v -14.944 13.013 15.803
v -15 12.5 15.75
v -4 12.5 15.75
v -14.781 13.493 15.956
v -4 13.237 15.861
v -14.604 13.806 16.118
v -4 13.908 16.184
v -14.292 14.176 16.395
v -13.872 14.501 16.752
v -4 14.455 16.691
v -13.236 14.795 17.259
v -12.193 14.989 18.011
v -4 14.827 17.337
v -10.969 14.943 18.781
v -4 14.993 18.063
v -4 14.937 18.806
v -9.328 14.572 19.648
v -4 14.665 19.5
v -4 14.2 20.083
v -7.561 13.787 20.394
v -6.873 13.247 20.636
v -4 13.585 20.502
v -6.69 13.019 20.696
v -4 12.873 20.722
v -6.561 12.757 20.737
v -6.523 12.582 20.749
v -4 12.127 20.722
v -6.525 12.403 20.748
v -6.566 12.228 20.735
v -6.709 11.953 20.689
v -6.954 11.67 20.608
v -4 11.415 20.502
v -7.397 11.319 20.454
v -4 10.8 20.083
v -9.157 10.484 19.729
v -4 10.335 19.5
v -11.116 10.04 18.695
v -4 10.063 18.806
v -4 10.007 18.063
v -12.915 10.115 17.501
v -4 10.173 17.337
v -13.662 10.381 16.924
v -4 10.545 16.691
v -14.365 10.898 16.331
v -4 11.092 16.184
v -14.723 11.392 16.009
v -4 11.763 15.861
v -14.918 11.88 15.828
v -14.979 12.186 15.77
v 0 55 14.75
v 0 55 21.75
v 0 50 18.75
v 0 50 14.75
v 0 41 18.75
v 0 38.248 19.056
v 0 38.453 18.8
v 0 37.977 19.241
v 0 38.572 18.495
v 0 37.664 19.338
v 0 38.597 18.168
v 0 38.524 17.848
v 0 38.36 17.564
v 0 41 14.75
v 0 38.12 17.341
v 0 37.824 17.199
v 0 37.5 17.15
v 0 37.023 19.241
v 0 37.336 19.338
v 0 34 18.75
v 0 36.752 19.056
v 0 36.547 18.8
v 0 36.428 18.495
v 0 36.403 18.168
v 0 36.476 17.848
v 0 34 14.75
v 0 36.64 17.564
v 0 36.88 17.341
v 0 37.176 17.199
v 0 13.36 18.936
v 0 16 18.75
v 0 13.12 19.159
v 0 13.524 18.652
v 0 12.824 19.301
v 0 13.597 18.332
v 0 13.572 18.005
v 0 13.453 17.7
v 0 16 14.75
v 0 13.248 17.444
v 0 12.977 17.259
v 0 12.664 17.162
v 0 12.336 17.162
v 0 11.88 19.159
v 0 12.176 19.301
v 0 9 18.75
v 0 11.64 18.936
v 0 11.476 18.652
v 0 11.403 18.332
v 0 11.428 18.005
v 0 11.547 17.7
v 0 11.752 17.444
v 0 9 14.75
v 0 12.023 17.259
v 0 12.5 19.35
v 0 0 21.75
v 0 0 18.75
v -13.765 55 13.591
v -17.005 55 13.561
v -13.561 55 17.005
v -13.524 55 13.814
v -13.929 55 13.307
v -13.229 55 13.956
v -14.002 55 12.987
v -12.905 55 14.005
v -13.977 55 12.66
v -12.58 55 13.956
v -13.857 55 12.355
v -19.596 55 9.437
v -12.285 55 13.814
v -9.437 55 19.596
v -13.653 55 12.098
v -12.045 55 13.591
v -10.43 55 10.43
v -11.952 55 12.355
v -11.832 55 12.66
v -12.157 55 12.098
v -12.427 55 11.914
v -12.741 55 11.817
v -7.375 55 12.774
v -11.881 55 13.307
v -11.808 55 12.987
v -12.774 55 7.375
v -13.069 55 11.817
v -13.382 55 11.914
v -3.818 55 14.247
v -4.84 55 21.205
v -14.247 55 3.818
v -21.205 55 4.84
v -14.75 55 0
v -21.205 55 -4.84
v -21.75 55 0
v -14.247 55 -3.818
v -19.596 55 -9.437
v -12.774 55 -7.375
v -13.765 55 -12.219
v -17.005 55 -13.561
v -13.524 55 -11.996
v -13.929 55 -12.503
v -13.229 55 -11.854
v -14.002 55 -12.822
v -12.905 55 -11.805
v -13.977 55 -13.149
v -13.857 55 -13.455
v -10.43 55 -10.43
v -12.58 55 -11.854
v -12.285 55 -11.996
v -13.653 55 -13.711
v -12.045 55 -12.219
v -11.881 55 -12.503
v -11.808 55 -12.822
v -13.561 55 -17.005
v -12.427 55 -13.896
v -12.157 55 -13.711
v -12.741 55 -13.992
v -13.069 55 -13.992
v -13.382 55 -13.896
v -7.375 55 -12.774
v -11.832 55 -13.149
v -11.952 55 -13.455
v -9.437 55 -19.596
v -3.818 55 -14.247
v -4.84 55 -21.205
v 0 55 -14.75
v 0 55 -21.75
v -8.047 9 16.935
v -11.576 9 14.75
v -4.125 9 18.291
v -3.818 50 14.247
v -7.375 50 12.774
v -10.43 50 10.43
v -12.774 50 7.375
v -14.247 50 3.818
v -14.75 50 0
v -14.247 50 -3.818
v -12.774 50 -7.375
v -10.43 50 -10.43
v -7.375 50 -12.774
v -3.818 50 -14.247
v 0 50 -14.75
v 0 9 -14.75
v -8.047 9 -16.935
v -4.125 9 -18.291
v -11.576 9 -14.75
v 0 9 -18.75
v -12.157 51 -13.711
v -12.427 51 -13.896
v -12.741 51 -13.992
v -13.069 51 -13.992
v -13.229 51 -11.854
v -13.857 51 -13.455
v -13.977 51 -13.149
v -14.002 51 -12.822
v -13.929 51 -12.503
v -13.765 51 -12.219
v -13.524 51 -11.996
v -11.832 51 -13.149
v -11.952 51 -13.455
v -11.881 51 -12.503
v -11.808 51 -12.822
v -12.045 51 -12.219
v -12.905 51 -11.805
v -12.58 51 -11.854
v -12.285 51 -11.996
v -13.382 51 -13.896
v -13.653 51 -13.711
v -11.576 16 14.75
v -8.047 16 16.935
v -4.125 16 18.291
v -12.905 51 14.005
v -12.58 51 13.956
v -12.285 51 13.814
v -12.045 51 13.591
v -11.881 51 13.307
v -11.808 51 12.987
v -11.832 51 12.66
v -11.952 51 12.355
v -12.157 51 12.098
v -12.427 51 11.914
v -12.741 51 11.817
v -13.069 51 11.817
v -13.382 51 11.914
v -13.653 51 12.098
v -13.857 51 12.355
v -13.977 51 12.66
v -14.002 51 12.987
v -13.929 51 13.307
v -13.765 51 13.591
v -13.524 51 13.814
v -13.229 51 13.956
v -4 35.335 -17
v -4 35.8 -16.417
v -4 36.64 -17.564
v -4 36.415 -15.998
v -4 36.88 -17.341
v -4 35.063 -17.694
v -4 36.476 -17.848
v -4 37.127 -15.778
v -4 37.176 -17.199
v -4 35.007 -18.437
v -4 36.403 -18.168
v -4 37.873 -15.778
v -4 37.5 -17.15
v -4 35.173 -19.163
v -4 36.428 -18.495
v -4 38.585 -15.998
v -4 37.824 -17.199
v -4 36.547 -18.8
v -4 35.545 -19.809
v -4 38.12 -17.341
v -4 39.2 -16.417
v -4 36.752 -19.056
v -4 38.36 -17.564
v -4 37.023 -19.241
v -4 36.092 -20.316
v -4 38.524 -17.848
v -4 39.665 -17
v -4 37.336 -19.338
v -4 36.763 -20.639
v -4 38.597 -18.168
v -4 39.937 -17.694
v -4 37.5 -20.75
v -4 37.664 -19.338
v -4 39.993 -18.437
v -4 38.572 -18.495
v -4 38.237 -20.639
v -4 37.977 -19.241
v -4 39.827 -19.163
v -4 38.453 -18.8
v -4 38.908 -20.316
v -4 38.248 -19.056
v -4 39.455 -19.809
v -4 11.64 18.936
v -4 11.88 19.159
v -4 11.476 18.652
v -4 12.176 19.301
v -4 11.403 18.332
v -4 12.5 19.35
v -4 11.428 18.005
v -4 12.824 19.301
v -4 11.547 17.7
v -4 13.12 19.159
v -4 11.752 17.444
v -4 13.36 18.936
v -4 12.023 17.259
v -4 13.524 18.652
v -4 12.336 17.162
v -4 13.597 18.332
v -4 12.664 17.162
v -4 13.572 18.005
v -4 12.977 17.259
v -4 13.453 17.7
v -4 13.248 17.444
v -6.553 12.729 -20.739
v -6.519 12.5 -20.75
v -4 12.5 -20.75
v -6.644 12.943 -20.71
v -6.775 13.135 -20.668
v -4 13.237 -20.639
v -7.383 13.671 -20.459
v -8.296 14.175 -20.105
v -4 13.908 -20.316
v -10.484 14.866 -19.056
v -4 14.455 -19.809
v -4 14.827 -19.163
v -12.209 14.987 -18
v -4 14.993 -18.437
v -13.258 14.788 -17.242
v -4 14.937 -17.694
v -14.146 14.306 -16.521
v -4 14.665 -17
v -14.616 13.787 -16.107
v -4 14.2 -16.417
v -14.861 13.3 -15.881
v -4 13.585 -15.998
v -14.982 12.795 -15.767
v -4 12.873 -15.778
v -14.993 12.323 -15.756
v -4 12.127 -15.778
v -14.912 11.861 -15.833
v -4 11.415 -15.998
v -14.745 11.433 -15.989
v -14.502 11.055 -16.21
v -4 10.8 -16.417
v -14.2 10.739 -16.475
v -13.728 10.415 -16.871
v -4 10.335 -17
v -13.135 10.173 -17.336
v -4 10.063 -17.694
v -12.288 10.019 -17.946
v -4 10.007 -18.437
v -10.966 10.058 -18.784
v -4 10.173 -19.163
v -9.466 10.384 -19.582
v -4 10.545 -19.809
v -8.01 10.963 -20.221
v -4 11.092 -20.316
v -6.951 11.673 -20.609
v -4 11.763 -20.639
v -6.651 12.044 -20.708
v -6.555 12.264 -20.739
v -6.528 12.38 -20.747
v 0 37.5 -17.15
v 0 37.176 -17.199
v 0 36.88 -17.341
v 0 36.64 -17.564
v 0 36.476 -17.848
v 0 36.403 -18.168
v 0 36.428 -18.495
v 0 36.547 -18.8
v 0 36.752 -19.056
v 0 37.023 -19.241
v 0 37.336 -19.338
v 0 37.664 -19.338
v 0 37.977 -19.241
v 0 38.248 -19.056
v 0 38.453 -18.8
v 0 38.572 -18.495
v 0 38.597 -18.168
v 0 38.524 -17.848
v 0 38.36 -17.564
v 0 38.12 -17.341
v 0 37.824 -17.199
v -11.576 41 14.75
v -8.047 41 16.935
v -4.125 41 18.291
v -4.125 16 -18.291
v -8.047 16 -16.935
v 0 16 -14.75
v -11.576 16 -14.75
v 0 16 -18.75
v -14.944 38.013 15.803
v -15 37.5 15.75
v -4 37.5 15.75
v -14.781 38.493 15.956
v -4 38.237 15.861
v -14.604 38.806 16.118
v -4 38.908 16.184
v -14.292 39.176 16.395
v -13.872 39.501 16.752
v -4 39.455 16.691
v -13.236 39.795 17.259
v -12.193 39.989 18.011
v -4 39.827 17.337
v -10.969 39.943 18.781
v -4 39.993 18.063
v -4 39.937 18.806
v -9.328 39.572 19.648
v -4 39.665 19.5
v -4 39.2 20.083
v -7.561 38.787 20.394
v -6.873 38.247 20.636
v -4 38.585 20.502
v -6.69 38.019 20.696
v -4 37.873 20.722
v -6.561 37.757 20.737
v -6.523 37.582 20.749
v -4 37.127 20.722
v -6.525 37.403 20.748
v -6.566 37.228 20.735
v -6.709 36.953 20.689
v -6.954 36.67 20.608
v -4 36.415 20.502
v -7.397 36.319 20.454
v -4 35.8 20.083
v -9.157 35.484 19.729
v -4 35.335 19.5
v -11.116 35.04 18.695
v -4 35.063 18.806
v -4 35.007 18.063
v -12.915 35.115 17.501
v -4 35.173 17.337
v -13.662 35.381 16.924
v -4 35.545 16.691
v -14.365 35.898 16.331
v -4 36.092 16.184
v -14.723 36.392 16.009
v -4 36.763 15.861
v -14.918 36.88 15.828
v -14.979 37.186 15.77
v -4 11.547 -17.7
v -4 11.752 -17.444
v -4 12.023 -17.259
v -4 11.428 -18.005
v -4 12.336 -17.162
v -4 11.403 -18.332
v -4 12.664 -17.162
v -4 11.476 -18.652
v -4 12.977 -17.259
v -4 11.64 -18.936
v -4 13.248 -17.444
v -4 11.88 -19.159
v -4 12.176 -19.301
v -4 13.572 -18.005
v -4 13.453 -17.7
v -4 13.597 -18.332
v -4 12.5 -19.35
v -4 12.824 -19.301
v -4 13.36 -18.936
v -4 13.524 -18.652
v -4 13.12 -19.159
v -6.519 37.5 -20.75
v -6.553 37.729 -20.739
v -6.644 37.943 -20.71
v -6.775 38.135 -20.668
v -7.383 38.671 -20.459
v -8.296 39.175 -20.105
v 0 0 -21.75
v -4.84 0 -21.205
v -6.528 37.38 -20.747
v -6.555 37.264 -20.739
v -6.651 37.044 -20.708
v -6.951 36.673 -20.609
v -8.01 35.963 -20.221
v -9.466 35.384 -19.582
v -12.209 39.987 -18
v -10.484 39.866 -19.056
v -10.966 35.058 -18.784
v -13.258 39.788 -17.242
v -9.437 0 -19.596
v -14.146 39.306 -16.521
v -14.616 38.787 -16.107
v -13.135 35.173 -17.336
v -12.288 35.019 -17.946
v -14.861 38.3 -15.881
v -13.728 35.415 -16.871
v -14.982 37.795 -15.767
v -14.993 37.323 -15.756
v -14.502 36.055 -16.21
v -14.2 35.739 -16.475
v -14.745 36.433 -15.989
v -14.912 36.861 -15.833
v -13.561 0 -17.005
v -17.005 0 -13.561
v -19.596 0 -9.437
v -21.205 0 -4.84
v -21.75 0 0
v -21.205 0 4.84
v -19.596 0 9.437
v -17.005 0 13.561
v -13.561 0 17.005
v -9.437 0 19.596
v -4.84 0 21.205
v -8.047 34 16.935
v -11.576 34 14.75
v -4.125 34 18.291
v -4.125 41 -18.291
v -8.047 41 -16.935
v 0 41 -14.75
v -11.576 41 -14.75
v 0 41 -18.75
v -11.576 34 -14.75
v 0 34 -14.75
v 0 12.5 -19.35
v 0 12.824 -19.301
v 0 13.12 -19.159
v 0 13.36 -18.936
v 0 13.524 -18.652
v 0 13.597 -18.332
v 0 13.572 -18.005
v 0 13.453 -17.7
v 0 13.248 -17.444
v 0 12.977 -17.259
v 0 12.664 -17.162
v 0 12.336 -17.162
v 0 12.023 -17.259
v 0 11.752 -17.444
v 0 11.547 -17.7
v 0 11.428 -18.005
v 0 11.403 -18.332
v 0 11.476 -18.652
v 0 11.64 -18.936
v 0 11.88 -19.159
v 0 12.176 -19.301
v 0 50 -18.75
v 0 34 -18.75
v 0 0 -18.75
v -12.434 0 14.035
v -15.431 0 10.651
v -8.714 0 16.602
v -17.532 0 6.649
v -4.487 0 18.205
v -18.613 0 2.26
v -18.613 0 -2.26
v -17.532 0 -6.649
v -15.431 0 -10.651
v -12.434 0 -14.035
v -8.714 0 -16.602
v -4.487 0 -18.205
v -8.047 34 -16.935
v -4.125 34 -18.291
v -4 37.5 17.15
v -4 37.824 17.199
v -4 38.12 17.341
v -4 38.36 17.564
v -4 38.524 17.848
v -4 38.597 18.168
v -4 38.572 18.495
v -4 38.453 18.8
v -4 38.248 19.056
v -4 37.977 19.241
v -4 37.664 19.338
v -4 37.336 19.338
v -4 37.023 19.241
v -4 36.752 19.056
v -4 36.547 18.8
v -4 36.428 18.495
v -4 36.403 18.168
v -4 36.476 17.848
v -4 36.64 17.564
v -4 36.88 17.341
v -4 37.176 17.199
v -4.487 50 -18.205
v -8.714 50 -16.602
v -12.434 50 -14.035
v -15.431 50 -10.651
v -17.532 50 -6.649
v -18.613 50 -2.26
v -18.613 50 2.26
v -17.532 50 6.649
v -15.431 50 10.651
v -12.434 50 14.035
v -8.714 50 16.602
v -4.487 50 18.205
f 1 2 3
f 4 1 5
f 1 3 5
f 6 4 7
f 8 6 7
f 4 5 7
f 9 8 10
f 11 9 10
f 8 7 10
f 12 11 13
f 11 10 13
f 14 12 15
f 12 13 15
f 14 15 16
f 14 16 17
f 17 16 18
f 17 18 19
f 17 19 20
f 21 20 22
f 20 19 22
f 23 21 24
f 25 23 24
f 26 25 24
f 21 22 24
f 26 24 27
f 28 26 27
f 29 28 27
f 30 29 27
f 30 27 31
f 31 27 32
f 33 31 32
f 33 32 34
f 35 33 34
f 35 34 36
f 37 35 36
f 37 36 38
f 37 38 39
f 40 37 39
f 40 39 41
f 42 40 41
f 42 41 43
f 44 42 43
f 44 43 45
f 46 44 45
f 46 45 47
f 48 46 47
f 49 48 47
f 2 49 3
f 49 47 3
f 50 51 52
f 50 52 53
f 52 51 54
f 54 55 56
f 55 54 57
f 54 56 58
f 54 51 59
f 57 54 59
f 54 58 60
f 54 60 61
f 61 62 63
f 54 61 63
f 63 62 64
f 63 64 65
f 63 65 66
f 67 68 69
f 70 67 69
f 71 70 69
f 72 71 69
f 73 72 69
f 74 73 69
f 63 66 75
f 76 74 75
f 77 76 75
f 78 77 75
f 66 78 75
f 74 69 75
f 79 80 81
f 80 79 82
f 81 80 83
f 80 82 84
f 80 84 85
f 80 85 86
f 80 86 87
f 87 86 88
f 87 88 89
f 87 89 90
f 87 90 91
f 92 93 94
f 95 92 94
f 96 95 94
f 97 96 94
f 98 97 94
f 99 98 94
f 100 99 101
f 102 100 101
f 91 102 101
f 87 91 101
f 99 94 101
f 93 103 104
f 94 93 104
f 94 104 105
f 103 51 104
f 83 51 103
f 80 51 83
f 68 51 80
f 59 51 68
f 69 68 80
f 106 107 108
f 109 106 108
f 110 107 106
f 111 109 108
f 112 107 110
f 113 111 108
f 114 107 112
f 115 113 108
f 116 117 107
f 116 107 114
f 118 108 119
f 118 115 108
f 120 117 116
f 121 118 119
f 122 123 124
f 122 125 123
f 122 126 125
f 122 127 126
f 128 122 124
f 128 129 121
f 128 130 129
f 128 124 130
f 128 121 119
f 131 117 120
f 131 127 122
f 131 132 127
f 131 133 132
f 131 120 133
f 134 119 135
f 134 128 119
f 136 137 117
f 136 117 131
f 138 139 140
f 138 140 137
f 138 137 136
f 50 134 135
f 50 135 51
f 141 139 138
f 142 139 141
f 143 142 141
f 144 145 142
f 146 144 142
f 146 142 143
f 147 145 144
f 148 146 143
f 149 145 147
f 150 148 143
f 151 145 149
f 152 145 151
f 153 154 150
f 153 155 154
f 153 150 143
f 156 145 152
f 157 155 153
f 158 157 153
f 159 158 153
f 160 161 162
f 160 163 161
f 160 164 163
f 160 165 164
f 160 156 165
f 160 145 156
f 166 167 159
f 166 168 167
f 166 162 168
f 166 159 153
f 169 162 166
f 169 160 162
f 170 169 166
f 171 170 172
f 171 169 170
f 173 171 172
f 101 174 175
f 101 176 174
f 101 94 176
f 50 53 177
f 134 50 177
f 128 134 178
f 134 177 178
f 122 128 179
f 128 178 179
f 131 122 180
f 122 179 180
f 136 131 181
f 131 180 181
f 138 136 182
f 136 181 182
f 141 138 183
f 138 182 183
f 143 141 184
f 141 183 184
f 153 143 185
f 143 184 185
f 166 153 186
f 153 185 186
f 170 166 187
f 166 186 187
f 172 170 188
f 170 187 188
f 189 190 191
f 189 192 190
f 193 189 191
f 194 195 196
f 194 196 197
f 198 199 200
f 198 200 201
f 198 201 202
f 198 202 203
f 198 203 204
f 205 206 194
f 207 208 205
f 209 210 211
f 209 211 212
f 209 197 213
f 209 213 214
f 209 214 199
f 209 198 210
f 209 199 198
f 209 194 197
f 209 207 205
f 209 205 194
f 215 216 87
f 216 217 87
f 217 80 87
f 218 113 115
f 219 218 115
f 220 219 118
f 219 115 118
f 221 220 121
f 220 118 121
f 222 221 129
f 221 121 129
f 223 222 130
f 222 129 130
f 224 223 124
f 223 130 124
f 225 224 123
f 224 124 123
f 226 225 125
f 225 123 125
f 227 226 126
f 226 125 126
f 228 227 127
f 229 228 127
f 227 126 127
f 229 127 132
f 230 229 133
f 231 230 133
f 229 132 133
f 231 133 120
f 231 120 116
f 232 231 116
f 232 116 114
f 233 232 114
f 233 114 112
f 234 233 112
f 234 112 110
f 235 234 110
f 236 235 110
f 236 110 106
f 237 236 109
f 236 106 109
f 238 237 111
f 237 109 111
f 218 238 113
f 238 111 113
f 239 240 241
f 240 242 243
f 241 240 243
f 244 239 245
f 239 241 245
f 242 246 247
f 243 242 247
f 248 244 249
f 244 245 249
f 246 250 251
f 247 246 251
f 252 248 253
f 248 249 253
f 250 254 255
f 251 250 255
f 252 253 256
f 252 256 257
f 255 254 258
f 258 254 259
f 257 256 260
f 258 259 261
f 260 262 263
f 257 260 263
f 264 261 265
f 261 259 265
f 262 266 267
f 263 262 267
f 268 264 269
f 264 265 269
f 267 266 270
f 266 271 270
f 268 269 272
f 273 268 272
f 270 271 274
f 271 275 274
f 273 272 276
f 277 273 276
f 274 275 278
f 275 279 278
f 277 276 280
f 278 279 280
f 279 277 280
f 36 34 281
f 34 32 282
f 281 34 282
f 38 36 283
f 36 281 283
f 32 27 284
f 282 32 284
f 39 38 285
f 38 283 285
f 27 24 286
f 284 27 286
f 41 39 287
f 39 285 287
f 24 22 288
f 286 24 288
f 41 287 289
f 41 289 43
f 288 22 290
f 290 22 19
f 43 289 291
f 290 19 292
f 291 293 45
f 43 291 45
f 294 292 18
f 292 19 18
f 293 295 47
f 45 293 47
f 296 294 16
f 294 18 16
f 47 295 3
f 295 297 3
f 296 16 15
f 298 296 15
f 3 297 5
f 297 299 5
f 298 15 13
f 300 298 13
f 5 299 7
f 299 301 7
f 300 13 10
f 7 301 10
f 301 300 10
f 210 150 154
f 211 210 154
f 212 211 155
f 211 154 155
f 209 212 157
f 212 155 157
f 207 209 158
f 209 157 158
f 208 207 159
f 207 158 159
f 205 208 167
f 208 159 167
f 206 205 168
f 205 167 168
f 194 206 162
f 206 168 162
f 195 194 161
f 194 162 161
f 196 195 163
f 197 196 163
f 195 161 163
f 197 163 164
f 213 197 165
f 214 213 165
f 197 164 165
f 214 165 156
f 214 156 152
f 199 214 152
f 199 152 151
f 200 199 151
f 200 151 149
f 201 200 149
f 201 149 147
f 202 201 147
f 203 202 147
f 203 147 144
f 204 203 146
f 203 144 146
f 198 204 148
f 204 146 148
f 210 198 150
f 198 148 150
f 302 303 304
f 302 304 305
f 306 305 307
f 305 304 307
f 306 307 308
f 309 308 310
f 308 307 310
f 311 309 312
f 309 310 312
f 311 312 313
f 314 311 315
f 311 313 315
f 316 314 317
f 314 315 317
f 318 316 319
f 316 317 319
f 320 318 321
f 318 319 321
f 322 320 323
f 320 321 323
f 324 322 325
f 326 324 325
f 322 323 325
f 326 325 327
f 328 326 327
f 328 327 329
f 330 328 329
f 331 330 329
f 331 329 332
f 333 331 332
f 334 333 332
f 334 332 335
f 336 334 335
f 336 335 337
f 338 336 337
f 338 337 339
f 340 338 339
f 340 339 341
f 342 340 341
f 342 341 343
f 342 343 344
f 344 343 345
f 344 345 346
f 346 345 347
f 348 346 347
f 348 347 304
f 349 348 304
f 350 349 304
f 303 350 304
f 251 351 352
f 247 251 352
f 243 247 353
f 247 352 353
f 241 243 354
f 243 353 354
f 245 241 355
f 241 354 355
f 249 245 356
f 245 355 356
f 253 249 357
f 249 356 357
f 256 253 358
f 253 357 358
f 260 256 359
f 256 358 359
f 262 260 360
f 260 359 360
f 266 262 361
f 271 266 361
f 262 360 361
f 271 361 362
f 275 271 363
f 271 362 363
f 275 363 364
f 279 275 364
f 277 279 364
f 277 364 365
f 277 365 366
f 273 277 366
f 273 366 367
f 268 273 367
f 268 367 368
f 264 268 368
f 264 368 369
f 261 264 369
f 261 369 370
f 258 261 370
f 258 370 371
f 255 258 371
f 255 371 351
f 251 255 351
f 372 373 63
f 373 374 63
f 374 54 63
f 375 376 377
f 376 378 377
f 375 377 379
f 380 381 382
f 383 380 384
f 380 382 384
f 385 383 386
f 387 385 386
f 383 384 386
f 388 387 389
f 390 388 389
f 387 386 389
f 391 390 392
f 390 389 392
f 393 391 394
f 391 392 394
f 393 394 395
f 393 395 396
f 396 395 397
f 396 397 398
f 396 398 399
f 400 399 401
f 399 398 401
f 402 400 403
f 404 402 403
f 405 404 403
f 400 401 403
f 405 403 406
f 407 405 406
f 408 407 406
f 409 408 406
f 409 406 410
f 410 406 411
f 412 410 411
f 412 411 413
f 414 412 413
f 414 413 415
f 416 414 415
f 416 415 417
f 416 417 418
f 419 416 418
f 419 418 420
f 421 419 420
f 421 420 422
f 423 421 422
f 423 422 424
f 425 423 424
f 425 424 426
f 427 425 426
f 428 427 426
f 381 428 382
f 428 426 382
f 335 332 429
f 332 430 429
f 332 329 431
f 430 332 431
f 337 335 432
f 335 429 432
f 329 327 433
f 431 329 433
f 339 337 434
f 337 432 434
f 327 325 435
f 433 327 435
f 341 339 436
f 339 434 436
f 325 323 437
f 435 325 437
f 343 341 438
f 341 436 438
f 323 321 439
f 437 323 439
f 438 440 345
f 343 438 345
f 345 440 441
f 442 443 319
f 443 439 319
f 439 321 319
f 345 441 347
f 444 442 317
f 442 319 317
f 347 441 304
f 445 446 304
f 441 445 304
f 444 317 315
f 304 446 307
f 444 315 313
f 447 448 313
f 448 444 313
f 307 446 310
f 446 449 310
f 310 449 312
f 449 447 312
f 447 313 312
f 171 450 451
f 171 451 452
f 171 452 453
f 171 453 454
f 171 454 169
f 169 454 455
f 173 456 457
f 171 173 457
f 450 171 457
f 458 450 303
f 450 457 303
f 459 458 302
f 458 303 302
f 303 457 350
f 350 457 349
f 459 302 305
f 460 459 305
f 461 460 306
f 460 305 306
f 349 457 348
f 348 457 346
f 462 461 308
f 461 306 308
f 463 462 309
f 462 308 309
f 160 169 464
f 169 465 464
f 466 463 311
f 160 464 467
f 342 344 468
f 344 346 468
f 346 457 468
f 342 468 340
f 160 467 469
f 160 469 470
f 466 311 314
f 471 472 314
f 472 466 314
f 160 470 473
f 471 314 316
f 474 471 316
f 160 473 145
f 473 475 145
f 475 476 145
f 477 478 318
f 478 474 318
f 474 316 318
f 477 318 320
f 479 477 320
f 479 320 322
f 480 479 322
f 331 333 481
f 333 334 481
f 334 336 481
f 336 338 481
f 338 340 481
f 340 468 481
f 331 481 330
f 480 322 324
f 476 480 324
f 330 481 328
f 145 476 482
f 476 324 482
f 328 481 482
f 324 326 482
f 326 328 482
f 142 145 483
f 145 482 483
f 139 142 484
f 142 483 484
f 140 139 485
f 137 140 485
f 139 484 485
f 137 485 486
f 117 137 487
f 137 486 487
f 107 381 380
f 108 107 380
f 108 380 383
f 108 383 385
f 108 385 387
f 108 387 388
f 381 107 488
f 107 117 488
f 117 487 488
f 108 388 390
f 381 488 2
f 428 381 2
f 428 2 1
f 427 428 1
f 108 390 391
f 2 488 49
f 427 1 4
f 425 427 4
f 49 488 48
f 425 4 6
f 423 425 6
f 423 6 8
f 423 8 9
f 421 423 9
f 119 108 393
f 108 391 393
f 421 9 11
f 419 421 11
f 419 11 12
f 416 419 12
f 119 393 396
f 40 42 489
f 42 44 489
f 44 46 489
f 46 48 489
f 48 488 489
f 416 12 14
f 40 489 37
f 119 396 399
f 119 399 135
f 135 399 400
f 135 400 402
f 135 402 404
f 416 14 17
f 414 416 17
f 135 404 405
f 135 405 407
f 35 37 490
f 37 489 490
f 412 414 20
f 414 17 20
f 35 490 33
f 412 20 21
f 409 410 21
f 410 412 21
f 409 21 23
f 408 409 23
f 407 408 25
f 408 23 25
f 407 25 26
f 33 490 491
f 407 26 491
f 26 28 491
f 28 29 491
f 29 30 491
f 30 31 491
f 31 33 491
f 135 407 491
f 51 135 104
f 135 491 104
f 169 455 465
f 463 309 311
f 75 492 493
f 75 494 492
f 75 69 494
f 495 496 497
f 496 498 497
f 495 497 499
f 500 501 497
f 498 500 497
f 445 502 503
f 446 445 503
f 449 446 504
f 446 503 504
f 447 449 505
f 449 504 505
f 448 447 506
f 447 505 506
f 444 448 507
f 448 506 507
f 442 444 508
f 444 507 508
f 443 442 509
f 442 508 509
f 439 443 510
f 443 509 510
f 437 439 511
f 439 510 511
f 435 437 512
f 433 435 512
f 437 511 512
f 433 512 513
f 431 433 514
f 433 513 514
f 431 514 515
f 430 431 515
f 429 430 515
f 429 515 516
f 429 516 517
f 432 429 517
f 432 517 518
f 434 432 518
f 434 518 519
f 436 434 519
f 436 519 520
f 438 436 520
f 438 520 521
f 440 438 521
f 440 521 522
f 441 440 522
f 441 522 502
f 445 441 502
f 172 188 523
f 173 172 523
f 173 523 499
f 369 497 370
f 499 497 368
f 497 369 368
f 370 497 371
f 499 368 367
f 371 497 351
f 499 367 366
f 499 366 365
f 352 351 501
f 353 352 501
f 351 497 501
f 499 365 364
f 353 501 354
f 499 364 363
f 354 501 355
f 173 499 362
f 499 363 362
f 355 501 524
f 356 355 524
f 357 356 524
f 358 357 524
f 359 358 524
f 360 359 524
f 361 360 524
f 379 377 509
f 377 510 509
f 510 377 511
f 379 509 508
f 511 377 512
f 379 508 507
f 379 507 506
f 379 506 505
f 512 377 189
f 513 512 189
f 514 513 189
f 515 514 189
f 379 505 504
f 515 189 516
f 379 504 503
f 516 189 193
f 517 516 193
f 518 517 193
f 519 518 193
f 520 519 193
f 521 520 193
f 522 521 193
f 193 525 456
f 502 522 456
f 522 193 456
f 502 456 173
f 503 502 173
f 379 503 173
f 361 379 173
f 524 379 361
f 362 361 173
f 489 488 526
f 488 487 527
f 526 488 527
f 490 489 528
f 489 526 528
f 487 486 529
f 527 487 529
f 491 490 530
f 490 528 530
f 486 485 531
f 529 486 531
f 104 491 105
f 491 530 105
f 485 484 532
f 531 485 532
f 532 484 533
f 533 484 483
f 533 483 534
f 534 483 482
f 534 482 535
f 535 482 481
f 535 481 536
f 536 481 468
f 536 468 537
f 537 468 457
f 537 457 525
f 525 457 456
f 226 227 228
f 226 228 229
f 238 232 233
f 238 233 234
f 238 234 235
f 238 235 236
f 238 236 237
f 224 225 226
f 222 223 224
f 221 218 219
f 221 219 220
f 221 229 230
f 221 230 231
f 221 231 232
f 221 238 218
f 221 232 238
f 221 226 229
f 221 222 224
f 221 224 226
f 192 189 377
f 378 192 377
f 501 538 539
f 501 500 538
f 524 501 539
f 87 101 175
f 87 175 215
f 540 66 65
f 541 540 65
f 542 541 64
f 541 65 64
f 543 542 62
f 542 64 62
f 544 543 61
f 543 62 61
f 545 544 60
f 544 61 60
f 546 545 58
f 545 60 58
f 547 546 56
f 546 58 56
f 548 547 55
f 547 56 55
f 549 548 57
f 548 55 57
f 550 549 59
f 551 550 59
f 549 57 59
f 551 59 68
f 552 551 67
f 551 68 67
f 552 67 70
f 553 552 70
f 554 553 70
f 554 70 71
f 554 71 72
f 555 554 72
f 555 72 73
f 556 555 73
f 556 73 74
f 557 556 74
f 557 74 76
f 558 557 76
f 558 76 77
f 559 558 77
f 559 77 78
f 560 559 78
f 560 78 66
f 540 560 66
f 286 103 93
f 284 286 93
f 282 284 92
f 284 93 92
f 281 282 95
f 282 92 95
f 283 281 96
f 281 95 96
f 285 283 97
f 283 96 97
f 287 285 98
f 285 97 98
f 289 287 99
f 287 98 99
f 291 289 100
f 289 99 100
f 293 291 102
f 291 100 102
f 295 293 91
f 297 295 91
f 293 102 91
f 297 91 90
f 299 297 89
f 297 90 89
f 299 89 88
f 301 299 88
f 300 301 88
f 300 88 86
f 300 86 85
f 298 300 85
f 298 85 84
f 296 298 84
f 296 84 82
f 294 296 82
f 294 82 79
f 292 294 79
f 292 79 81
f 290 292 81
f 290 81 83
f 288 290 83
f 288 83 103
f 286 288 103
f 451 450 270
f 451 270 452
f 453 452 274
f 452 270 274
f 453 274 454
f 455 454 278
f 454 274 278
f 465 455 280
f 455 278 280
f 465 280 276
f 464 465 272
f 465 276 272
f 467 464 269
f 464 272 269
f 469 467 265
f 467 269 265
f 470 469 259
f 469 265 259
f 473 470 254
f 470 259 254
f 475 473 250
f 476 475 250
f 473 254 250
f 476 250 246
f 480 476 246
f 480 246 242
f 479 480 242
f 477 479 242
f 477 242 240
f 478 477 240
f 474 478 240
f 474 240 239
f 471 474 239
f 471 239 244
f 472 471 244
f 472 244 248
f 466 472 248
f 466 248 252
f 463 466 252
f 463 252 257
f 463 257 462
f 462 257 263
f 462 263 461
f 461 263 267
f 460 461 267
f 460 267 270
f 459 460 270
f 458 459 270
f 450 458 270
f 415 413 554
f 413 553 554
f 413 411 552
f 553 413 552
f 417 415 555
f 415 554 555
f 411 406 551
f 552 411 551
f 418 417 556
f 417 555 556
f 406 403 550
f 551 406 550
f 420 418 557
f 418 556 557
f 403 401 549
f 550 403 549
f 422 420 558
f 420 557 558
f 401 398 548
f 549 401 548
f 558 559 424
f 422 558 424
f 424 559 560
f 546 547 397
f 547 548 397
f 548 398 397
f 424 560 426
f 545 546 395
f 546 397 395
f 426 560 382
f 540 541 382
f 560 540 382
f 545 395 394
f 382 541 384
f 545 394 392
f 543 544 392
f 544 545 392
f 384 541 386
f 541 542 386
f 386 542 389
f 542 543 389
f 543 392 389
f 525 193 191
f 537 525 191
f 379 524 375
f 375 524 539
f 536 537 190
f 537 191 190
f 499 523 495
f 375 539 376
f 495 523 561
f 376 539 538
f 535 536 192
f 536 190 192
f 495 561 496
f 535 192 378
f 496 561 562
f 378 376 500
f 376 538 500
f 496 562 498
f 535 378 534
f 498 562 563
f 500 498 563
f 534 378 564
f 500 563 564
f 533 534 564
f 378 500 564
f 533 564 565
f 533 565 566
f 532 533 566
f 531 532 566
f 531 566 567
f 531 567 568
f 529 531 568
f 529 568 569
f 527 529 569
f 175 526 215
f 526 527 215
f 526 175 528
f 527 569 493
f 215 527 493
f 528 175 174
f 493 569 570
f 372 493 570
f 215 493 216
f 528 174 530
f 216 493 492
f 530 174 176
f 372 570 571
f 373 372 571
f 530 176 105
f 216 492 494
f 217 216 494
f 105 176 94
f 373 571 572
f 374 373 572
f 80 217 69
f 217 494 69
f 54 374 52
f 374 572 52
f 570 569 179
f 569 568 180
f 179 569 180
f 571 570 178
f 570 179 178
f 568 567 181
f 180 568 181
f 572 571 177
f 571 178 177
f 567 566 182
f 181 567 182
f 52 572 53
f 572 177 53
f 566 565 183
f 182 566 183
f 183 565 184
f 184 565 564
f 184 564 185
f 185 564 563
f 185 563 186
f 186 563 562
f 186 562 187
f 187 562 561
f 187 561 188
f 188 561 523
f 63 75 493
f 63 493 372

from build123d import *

# Parameters (mm, degrees)
EXTRUDE_1_DEPTH      = 55
CUT_EXTRUDE_START    = -5
SKETCH_2_R           = 18.75
SKETCH_2_R_2         = 14.75
CUT_EXTRUDE_1_DEPTH  = 59.016862823
EXTRUDE_3_REACH      = 65.017
EXTRUDE_3_END_RADIUS = 18.75
SKETCH_4_W           = 7
SKETCH_4_H           = 7
SKETCH_3_R           = 1.1
CUT_EXTRUDE_2_DEPTH  = 5
CUT_EXTRUDE_START_2  = -4
SKETCH_5_R           = 2.5
CUT_EXTRUDE_3_DEPTH  = 60.016862823
SKETCH_6_R           = 1.1
CUT_EXTRUDE_4_DEPTH  = 4


with BuildPart() as part:
    # ｽｹｯﾁ1 → ﾎﾞｽ - 押し出し1 (new body)
    with BuildSketch(Plane(origin=(0, 0, 0), x_dir=(1, 0, 0), z_dir=(0, 1, 0))):
        with BuildLine():
            Line((0, -21.75), (0, -14.75))
            ThreePointArc((0, -14.75), (-14.75, 0), (0, 14.75))
            Line((0, 14.75), (0, 21.75))
            ThreePointArc((0, 21.75), (-21.75, 0), (0, -21.75))
        make_face()
    extrude(amount=EXTRUDE_1_DEPTH)

    # ｽｹｯﾁ2 → ｶｯﾄ - 押し出し1 (cut, through all)
    with BuildSketch(Plane(origin=(0, 55, 0), x_dir=(1, 0, 0), z_dir=(0, 1, 0)).offset(CUT_EXTRUDE_START)):
        Circle(SKETCH_2_R)
        Circle(SKETCH_2_R_2, mode=Mode.SUBTRACT)
    extrude(amount=-CUT_EXTRUDE_1_DEPTH, mode=Mode.SUBTRACT)

    # ﾎﾞｽ - 押し出し3: up to this cylinder (the profile starts inside it)
    extrude_3_end = Plane(origin=(0, 25, 0), z_dir=(0, 1, 0)) * Cylinder(EXTRUDE_3_END_RADIUS, 193.534, mode=Mode.PRIVATE)
    # ｽｹｯﾁ4 → ﾎﾞｽ - 押し出し3 (add, up to the surface)
    with BuildSketch(Plane(origin=(0, 0, 0), x_dir=(0, 0, -1), z_dir=(1, 0, 0)), mode=Mode.PRIVATE) as extrude_3_sk1:
        with Locations((-18.25, 37.5)):
            Rectangle(SKETCH_4_W, SKETCH_4_H)
    extrude_3_tool1 = extrude(extrude_3_sk1.sketch, amount=-EXTRUDE_3_REACH, mode=Mode.PRIVATE) & extrude_3_end
    add(extrude_3_tool1.solids().sort_by_distance((0, 37.5, 18.25))[0])
    # ｽｹｯﾁ4 → ﾎﾞｽ - 押し出し3 (add, up to the surface)
    with BuildSketch(Plane(origin=(0, 0, 0), x_dir=(0, 0, -1), z_dir=(1, 0, 0)), mode=Mode.PRIVATE) as extrude_3_sk2:
        with Locations((-18.25, 12.5)):
            Rectangle(SKETCH_4_W, SKETCH_4_H)
    extrude_3_tool2 = extrude(extrude_3_sk2.sketch, amount=-EXTRUDE_3_REACH, mode=Mode.PRIVATE) & extrude_3_end
    add(extrude_3_tool2.solids().sort_by_distance((0, 12.5, 18.25))[0])
    # ｽｹｯﾁ4 → ﾎﾞｽ - 押し出し3 (add, up to the surface)
    with BuildSketch(Plane(origin=(0, 0, 0), x_dir=(0, 0, -1), z_dir=(1, 0, 0)), mode=Mode.PRIVATE) as extrude_3_sk3:
        with Locations((18.25, 12.5)):
            Rectangle(SKETCH_4_W, SKETCH_4_H)
    extrude_3_tool3 = extrude(extrude_3_sk3.sketch, amount=-EXTRUDE_3_REACH, mode=Mode.PRIVATE) & extrude_3_end
    add(extrude_3_tool3.solids().sort_by_distance((0, 12.5, -18.25))[0])
    # ｽｹｯﾁ4 → ﾎﾞｽ - 押し出し3 (add, up to the surface)
    with BuildSketch(Plane(origin=(0, 0, 0), x_dir=(0, 0, -1), z_dir=(1, 0, 0)), mode=Mode.PRIVATE) as extrude_3_sk4:
        with Locations((18.25, 37.5)):
            Rectangle(SKETCH_4_W, SKETCH_4_H)
    extrude_3_tool4 = extrude(extrude_3_sk4.sketch, amount=-EXTRUDE_3_REACH, mode=Mode.PRIVATE) & extrude_3_end
    add(extrude_3_tool4.solids().sort_by_distance((0, 37.5, -18.25))[0])

    # ｽｹｯﾁ3 → ｶｯﾄ - 押し出し2 (cut)
    with BuildSketch(Plane(origin=(0, 0, 0), x_dir=(0, 0, -1), z_dir=(1, 0, 0))):
        with Locations((-18.25, 37.5)):
            Circle(SKETCH_3_R)
        with Locations(Location((18.25, 37.5, 0), (0, 0, 180))):
            Circle(SKETCH_3_R)
        with Locations((18.25, 12.5)):
            Circle(SKETCH_3_R)
        with Locations(Location((-18.25, 12.5, 0), (0, 0, 180))):
            Circle(SKETCH_3_R)
    extrude(amount=-CUT_EXTRUDE_2_DEPTH, mode=Mode.SUBTRACT)

    # ｽｹｯﾁ5 → ｶｯﾄ - 押し出し3 (cut, through all)
    with BuildSketch(Plane(origin=(0, 0, 0), x_dir=(0, 0, -1), z_dir=(1, 0, 0)).offset(CUT_EXTRUDE_START_2)):
        with Locations((-18.25, 37.5)):
            Circle(SKETCH_5_R)
        with Locations((-18.25, 12.5)):
            Circle(SKETCH_5_R)
        with Locations((18.25, 12.5)):
            Circle(SKETCH_5_R)
        with Locations((18.25, 37.5)):
            Circle(SKETCH_5_R)
    extrude(amount=-CUT_EXTRUDE_3_DEPTH, mode=Mode.SUBTRACT)

    # ｽｹｯﾁ6 → ｶｯﾄ - 押し出し4 (cut)
    with BuildSketch(Plane(origin=(0, 55, 0), x_dir=(1, 0, 0), z_dir=(0, 1, 0))):
        with Locations(Location((-12.904698757, -12.904698757, 0), (0, 0, 270))):
            Circle(SKETCH_6_R)
        with Locations(Location((-12.904698757, 12.904698757, 0), (0, 0, 270))):
            Circle(SKETCH_6_R)
    extrude(amount=-CUT_EXTRUDE_4_DEPTH, mode=Mode.SUBTRACT)


solid = part.part
